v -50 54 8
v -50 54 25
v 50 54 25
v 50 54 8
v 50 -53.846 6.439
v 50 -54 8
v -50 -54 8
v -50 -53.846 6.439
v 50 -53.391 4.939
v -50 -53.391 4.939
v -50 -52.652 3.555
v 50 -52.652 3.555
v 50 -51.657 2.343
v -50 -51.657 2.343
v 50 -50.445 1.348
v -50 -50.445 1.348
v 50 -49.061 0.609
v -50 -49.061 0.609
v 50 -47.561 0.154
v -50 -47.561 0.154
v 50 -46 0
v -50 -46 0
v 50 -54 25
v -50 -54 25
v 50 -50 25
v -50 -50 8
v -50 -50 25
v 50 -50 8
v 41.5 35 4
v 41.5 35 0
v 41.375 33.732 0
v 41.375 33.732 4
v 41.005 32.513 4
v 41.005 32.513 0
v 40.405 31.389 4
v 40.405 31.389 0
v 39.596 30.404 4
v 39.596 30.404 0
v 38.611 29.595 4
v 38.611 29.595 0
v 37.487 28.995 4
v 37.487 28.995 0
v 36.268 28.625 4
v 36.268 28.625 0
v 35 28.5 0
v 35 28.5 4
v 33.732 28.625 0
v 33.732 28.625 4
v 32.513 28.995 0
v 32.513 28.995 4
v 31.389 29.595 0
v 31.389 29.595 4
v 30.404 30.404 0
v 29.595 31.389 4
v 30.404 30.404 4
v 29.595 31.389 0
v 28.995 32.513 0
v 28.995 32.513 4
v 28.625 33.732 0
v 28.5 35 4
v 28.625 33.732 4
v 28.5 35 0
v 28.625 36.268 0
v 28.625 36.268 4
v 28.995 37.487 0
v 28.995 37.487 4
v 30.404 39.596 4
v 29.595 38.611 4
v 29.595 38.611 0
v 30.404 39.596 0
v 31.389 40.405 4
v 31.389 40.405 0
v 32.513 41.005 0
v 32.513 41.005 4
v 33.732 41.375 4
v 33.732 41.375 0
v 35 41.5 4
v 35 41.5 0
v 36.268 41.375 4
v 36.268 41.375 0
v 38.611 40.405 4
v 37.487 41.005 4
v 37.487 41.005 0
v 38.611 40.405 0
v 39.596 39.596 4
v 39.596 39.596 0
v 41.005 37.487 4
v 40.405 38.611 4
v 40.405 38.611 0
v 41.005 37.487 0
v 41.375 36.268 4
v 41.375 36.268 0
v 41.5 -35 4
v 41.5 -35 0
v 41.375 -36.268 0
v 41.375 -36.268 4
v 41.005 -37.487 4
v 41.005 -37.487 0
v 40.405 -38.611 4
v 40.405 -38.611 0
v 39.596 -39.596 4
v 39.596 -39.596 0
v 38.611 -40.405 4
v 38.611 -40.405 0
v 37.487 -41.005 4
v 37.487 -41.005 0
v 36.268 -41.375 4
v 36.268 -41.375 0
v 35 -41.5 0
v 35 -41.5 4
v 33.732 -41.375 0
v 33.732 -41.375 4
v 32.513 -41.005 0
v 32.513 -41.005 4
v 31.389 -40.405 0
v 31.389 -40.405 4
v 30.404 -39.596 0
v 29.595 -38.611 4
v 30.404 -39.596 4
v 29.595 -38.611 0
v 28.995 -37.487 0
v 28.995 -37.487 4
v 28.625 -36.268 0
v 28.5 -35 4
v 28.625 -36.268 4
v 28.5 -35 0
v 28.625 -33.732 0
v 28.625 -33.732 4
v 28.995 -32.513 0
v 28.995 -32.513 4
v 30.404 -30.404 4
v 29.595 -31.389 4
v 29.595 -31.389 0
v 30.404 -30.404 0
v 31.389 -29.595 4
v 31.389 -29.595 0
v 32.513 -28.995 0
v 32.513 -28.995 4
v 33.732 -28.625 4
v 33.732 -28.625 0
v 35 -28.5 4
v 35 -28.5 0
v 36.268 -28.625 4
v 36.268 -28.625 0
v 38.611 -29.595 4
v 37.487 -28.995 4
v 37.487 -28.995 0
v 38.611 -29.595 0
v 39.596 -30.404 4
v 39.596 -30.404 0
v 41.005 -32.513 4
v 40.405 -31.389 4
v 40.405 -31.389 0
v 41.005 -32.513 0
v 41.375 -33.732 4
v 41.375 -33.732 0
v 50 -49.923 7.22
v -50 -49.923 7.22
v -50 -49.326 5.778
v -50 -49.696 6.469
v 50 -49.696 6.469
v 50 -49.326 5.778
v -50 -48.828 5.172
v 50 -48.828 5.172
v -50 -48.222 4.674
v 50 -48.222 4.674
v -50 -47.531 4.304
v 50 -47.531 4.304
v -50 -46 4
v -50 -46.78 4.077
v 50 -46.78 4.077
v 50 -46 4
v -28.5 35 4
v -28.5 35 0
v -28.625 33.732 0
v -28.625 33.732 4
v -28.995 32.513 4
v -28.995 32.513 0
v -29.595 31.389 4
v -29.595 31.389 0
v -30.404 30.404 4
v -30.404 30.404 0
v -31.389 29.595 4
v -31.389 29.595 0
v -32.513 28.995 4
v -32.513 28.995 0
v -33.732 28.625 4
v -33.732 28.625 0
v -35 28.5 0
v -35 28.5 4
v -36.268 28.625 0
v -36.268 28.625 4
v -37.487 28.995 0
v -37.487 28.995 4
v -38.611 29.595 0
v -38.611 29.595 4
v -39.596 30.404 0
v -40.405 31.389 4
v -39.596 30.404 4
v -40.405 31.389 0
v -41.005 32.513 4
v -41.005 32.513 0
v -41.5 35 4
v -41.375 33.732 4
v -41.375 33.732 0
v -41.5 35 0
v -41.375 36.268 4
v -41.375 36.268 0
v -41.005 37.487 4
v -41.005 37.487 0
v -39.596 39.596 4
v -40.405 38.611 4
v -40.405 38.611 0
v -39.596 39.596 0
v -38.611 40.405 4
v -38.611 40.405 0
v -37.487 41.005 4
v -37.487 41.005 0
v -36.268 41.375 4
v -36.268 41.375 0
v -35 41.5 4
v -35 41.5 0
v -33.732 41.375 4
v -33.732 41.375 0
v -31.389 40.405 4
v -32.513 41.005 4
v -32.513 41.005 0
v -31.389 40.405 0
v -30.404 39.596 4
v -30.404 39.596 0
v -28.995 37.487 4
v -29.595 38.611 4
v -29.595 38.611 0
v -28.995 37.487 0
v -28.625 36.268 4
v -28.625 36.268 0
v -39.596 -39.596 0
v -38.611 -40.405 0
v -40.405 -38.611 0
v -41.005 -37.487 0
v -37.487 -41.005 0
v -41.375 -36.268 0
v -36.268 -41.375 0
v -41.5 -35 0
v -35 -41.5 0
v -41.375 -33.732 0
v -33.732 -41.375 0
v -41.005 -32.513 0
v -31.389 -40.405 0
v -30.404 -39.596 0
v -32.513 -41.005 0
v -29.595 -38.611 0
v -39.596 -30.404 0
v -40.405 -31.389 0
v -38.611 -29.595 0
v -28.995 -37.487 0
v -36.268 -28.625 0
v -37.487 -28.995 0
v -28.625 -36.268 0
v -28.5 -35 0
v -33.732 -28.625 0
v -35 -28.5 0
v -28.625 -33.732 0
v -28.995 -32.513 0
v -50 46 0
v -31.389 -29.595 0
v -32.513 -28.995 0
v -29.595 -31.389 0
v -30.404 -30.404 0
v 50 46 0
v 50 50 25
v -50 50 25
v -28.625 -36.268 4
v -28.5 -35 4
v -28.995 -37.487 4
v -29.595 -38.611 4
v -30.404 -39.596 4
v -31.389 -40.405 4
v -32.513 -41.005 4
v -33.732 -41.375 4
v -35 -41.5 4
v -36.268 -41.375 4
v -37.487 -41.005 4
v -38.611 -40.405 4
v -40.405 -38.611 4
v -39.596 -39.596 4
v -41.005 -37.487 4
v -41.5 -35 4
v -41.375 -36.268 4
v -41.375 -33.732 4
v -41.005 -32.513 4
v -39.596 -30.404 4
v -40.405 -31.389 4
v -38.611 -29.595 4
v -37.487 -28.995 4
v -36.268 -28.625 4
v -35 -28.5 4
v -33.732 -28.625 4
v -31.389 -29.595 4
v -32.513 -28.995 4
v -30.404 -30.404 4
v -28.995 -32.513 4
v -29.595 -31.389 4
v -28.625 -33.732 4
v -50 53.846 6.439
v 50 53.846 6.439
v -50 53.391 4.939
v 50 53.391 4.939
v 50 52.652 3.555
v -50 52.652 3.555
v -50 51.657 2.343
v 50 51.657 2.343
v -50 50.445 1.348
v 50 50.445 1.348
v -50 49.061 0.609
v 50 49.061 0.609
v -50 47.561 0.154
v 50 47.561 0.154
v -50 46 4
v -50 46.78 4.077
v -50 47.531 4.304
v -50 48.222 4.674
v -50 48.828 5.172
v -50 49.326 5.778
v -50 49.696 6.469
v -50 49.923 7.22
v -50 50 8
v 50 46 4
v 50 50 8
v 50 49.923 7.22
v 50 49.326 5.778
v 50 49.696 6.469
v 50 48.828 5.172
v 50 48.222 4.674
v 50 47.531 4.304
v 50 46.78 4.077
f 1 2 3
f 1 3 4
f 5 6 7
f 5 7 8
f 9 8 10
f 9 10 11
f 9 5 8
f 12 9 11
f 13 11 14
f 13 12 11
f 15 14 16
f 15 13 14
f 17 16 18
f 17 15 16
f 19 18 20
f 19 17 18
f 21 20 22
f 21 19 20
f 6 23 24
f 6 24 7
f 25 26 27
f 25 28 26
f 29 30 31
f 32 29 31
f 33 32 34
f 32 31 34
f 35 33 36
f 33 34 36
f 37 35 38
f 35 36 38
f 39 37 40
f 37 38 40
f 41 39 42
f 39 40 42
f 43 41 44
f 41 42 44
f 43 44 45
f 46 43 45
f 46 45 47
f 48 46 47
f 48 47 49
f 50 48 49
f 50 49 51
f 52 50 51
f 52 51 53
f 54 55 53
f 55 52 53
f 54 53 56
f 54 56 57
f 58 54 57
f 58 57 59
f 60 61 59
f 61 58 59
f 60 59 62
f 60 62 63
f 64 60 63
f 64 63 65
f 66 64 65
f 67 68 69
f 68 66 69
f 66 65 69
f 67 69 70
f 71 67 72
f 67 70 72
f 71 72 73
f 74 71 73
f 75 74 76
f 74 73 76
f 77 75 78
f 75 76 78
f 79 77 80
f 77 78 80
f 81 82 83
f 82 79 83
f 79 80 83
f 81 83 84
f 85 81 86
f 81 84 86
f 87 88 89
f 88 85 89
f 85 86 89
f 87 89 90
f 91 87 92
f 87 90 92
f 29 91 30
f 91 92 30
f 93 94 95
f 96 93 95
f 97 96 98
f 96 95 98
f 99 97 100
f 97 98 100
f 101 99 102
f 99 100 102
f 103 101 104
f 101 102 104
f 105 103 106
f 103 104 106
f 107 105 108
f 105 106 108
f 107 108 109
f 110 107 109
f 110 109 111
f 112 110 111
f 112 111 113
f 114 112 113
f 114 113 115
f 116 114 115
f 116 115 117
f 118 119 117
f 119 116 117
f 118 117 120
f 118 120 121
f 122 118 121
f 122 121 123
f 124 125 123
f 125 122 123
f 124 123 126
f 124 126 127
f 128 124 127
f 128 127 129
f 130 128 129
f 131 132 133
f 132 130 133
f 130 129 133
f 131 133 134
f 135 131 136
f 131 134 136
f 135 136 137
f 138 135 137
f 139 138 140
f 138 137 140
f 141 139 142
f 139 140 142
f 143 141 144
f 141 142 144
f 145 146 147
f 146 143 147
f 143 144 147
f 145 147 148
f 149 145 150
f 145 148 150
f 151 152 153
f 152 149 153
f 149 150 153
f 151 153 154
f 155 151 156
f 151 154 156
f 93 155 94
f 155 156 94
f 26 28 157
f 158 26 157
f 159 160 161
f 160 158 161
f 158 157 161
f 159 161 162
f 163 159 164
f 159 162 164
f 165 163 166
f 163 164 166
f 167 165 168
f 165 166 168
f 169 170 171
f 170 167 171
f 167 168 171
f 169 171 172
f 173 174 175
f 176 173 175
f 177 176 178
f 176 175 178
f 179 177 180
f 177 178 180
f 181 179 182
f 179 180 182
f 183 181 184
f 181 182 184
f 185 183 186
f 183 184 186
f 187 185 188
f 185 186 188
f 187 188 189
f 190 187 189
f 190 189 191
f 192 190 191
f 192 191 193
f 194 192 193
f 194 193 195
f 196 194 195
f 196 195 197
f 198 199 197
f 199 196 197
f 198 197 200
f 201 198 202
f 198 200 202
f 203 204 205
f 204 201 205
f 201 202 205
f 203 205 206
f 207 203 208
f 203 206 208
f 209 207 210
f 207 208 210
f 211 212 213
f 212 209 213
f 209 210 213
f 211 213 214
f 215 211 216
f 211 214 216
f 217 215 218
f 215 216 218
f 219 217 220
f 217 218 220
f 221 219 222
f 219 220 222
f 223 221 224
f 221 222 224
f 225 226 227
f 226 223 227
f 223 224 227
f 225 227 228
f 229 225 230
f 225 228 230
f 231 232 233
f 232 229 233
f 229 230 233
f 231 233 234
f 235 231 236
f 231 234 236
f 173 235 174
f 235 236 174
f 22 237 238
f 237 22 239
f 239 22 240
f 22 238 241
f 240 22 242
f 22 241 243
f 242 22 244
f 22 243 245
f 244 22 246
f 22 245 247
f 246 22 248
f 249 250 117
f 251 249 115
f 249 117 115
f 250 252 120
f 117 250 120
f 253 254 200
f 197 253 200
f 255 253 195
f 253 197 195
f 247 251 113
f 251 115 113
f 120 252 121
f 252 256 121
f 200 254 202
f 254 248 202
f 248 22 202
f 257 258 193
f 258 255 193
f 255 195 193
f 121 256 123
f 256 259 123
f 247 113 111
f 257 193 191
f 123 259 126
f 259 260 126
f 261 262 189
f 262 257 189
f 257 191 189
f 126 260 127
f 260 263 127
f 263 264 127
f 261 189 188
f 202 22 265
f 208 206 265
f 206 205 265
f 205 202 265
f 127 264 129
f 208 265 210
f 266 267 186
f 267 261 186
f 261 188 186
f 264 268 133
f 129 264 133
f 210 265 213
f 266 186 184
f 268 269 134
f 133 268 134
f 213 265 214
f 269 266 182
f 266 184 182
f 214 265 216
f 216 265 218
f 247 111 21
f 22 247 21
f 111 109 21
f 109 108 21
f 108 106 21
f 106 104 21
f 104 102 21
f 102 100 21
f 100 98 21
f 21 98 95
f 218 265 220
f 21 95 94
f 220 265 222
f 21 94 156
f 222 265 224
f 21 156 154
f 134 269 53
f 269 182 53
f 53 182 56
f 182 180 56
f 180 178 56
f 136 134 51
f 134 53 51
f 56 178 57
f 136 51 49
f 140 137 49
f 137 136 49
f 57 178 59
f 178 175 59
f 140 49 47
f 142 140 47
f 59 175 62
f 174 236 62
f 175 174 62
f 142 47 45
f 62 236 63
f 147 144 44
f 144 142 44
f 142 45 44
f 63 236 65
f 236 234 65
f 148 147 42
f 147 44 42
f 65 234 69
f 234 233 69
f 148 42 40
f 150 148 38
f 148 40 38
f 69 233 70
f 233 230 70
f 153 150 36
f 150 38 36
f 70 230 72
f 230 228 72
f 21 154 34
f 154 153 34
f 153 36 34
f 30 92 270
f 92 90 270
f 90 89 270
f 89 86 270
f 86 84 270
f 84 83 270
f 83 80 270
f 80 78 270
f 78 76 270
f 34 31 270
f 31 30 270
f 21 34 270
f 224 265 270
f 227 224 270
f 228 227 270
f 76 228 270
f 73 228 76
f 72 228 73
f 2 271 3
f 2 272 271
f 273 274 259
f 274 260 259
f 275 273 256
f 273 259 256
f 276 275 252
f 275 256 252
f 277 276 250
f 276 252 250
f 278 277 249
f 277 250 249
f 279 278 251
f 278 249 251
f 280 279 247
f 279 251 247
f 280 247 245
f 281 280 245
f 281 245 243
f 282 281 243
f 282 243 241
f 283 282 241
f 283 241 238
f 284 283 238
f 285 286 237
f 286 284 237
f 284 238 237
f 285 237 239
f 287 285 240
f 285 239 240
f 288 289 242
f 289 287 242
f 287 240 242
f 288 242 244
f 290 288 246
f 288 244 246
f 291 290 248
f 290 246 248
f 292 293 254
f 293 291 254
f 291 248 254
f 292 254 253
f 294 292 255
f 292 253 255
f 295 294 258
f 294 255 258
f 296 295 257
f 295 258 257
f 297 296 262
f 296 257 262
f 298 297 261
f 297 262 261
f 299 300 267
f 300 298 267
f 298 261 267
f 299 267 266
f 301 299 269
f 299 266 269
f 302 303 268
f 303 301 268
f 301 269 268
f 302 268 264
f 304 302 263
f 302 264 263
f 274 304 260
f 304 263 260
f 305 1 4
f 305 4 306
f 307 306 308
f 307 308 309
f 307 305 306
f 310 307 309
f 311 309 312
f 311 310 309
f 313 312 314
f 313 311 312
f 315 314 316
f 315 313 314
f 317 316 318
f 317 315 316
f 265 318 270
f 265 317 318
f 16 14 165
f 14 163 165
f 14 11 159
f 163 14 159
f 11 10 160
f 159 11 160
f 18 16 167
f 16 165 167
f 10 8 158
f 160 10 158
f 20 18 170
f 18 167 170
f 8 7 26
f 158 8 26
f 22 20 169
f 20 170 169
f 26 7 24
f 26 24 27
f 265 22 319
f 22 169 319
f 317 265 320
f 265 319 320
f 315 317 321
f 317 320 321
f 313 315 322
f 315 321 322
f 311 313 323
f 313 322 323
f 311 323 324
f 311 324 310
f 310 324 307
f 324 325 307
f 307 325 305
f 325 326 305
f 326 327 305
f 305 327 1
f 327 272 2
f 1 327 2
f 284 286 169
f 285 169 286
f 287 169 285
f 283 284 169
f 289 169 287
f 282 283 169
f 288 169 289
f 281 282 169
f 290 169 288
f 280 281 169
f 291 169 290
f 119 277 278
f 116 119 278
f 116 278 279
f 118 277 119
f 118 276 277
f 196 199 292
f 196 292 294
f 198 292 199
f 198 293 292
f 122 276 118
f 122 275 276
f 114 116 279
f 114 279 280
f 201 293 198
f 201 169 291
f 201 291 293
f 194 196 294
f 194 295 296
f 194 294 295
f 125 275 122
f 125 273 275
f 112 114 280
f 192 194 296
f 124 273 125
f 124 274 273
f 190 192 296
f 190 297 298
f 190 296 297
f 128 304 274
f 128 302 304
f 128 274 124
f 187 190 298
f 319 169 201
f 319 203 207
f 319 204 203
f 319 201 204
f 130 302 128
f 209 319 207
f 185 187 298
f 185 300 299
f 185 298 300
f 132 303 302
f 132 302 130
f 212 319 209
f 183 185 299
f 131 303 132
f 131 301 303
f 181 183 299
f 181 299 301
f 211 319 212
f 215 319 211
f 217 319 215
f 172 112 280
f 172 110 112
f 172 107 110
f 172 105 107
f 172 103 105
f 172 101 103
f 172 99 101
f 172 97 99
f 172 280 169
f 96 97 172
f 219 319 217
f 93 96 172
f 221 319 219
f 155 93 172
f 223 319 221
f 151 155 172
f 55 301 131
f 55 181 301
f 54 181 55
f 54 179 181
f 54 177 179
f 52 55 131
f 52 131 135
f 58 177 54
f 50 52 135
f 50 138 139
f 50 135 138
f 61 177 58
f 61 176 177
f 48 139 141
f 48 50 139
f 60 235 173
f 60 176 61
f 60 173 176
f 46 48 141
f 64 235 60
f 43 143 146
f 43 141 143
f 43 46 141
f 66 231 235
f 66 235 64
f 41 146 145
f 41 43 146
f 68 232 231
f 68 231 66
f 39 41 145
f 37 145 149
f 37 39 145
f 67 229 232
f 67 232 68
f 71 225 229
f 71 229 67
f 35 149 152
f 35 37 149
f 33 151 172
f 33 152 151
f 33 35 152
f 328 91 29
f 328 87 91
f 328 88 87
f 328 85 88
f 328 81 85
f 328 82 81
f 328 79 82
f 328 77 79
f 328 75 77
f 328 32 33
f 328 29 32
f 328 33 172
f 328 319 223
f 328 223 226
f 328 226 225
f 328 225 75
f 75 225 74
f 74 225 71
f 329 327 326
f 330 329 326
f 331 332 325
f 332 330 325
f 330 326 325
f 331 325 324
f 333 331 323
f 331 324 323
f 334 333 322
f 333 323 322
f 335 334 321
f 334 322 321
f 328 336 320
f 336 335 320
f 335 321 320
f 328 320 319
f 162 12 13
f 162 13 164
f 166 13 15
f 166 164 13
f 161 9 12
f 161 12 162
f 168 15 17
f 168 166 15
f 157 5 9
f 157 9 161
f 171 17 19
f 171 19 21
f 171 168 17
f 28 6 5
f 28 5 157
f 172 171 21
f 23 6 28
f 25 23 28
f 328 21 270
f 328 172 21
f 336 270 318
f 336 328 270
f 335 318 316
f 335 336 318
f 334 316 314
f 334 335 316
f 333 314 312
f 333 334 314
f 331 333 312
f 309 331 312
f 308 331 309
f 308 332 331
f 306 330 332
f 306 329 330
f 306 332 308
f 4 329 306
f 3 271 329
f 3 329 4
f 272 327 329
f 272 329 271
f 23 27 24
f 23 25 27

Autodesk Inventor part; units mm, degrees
ref_plane "YZ Plane" through (0, 0, 0) normal (1, 0, 0) x (0, 1, 0)
ref_plane "XZ Plane" through (0, 0, 0) normal (0, 1, 0) x (-1, 0, 0)
ref_plane "XY Plane" through (0, 0, 0) normal (0, 0, 1) x (1, 0, 0)
sketch "Sketch1" plane through (0, 0, 0) normal (0, 0, 1) x (1, 0, 0)
  line L0 (-50, 50) -> (50, 50)
  line L1 (50, 50) -> (50, -50)
  line L2 (50, -50) -> (-50, -50)
  line L3 (-50, -50) -> (-50, 50)
  line L4 (-50, 50) -> (50, -50) construction
  line L5 (50, 50) -> (-50, -50) construction
  line L6 (0, 50) -> (0, -50) construction
  circle A0 centre (-35, -35) radius 6.5
  circle A1 centre (-35, 35) radius 6.5
  circle A2 centre (35, -35) radius 6.5
  circle A3 centre (35, 35) radius 6.5
  line L7 (35, 35) -> (-35, 35) construction
  line L8 (-35, 35) -> (-35, -35) construction
  line L9 (-35, -35) -> (35, -35) construction
  line L10 (35, -35) -> (35, 35) construction
  line L11 (35, 35) -> (-35, -35) construction
  line L12 (-35, 35) -> (35, -35) construction
  point P0 (0, 0)
  dimension "d0" = 100
  dimension "d1" = 100
  dimension "d19" = 13
  dimension "d20" = 70
extrude "Plate1" add sketch "Sketch1" along normal blind 4
sketch "Sketch3" plane through (50, -54, 0) normal (0, 1, 0) x (-1, 0, 0)
  line L0 (100, 0) -> (0, 0)
  line L1 (0, 0) -> (0, 25)
  line L2 (0, 25) -> (100, 25)
  line L3 (100, 25) -> (100, 0)
edge flange "Flange1" height 25 angle 90 thickness 4 bend radius 4 thickness toward (0, 1, 0) relief tear relief width 4 relief depth 2 corner gap 4 corner form 0 edges at (0, -50, 4) (0, 50, 4) wall of the first edge with corners at (-50, -54, 0) (50, -54, 0) (50, -54, 25) (-50, -54, 25)
bend "Bend1"
corner "Corner1"
equation "\"d0\" = d1"
equation "\"d2\" = Thickness"
equation "\"d21\" = BendReliefWidth"
equation "\"d22\" = BendReliefDepth"
equation "\"d23\" = MinimumRemnant"
equation "\"d24\" = TransitionRadius"
equation "\"d27\" = BendRadius"
equation "\"d28\" = CornerReliefSize"
equation "\"d29\" = GapSize"
equation "\"d30\" = JacobiRadiusSize"
equation "\"BendRadius\" = Thickness"
equation "\"BendReliefWidth\" = Thickness"
equation "\"BendReliefDepth\" = 0.5 * Thickness"
equation "\"CornerReliefSize\" = 4 * Thickness"
equation "\"MinimumRemnant\" = 2 * Thickness"
equation "\"TransitionRadius\" = BendRadius"
equation "\"JacobiRadiusSize\" = BendRadius"
equation "\"GapSize\" = Thickness"
equation "\"Thickness\" = 4"
properties part number "GBK-RK-0820 ring plate_CPY"
